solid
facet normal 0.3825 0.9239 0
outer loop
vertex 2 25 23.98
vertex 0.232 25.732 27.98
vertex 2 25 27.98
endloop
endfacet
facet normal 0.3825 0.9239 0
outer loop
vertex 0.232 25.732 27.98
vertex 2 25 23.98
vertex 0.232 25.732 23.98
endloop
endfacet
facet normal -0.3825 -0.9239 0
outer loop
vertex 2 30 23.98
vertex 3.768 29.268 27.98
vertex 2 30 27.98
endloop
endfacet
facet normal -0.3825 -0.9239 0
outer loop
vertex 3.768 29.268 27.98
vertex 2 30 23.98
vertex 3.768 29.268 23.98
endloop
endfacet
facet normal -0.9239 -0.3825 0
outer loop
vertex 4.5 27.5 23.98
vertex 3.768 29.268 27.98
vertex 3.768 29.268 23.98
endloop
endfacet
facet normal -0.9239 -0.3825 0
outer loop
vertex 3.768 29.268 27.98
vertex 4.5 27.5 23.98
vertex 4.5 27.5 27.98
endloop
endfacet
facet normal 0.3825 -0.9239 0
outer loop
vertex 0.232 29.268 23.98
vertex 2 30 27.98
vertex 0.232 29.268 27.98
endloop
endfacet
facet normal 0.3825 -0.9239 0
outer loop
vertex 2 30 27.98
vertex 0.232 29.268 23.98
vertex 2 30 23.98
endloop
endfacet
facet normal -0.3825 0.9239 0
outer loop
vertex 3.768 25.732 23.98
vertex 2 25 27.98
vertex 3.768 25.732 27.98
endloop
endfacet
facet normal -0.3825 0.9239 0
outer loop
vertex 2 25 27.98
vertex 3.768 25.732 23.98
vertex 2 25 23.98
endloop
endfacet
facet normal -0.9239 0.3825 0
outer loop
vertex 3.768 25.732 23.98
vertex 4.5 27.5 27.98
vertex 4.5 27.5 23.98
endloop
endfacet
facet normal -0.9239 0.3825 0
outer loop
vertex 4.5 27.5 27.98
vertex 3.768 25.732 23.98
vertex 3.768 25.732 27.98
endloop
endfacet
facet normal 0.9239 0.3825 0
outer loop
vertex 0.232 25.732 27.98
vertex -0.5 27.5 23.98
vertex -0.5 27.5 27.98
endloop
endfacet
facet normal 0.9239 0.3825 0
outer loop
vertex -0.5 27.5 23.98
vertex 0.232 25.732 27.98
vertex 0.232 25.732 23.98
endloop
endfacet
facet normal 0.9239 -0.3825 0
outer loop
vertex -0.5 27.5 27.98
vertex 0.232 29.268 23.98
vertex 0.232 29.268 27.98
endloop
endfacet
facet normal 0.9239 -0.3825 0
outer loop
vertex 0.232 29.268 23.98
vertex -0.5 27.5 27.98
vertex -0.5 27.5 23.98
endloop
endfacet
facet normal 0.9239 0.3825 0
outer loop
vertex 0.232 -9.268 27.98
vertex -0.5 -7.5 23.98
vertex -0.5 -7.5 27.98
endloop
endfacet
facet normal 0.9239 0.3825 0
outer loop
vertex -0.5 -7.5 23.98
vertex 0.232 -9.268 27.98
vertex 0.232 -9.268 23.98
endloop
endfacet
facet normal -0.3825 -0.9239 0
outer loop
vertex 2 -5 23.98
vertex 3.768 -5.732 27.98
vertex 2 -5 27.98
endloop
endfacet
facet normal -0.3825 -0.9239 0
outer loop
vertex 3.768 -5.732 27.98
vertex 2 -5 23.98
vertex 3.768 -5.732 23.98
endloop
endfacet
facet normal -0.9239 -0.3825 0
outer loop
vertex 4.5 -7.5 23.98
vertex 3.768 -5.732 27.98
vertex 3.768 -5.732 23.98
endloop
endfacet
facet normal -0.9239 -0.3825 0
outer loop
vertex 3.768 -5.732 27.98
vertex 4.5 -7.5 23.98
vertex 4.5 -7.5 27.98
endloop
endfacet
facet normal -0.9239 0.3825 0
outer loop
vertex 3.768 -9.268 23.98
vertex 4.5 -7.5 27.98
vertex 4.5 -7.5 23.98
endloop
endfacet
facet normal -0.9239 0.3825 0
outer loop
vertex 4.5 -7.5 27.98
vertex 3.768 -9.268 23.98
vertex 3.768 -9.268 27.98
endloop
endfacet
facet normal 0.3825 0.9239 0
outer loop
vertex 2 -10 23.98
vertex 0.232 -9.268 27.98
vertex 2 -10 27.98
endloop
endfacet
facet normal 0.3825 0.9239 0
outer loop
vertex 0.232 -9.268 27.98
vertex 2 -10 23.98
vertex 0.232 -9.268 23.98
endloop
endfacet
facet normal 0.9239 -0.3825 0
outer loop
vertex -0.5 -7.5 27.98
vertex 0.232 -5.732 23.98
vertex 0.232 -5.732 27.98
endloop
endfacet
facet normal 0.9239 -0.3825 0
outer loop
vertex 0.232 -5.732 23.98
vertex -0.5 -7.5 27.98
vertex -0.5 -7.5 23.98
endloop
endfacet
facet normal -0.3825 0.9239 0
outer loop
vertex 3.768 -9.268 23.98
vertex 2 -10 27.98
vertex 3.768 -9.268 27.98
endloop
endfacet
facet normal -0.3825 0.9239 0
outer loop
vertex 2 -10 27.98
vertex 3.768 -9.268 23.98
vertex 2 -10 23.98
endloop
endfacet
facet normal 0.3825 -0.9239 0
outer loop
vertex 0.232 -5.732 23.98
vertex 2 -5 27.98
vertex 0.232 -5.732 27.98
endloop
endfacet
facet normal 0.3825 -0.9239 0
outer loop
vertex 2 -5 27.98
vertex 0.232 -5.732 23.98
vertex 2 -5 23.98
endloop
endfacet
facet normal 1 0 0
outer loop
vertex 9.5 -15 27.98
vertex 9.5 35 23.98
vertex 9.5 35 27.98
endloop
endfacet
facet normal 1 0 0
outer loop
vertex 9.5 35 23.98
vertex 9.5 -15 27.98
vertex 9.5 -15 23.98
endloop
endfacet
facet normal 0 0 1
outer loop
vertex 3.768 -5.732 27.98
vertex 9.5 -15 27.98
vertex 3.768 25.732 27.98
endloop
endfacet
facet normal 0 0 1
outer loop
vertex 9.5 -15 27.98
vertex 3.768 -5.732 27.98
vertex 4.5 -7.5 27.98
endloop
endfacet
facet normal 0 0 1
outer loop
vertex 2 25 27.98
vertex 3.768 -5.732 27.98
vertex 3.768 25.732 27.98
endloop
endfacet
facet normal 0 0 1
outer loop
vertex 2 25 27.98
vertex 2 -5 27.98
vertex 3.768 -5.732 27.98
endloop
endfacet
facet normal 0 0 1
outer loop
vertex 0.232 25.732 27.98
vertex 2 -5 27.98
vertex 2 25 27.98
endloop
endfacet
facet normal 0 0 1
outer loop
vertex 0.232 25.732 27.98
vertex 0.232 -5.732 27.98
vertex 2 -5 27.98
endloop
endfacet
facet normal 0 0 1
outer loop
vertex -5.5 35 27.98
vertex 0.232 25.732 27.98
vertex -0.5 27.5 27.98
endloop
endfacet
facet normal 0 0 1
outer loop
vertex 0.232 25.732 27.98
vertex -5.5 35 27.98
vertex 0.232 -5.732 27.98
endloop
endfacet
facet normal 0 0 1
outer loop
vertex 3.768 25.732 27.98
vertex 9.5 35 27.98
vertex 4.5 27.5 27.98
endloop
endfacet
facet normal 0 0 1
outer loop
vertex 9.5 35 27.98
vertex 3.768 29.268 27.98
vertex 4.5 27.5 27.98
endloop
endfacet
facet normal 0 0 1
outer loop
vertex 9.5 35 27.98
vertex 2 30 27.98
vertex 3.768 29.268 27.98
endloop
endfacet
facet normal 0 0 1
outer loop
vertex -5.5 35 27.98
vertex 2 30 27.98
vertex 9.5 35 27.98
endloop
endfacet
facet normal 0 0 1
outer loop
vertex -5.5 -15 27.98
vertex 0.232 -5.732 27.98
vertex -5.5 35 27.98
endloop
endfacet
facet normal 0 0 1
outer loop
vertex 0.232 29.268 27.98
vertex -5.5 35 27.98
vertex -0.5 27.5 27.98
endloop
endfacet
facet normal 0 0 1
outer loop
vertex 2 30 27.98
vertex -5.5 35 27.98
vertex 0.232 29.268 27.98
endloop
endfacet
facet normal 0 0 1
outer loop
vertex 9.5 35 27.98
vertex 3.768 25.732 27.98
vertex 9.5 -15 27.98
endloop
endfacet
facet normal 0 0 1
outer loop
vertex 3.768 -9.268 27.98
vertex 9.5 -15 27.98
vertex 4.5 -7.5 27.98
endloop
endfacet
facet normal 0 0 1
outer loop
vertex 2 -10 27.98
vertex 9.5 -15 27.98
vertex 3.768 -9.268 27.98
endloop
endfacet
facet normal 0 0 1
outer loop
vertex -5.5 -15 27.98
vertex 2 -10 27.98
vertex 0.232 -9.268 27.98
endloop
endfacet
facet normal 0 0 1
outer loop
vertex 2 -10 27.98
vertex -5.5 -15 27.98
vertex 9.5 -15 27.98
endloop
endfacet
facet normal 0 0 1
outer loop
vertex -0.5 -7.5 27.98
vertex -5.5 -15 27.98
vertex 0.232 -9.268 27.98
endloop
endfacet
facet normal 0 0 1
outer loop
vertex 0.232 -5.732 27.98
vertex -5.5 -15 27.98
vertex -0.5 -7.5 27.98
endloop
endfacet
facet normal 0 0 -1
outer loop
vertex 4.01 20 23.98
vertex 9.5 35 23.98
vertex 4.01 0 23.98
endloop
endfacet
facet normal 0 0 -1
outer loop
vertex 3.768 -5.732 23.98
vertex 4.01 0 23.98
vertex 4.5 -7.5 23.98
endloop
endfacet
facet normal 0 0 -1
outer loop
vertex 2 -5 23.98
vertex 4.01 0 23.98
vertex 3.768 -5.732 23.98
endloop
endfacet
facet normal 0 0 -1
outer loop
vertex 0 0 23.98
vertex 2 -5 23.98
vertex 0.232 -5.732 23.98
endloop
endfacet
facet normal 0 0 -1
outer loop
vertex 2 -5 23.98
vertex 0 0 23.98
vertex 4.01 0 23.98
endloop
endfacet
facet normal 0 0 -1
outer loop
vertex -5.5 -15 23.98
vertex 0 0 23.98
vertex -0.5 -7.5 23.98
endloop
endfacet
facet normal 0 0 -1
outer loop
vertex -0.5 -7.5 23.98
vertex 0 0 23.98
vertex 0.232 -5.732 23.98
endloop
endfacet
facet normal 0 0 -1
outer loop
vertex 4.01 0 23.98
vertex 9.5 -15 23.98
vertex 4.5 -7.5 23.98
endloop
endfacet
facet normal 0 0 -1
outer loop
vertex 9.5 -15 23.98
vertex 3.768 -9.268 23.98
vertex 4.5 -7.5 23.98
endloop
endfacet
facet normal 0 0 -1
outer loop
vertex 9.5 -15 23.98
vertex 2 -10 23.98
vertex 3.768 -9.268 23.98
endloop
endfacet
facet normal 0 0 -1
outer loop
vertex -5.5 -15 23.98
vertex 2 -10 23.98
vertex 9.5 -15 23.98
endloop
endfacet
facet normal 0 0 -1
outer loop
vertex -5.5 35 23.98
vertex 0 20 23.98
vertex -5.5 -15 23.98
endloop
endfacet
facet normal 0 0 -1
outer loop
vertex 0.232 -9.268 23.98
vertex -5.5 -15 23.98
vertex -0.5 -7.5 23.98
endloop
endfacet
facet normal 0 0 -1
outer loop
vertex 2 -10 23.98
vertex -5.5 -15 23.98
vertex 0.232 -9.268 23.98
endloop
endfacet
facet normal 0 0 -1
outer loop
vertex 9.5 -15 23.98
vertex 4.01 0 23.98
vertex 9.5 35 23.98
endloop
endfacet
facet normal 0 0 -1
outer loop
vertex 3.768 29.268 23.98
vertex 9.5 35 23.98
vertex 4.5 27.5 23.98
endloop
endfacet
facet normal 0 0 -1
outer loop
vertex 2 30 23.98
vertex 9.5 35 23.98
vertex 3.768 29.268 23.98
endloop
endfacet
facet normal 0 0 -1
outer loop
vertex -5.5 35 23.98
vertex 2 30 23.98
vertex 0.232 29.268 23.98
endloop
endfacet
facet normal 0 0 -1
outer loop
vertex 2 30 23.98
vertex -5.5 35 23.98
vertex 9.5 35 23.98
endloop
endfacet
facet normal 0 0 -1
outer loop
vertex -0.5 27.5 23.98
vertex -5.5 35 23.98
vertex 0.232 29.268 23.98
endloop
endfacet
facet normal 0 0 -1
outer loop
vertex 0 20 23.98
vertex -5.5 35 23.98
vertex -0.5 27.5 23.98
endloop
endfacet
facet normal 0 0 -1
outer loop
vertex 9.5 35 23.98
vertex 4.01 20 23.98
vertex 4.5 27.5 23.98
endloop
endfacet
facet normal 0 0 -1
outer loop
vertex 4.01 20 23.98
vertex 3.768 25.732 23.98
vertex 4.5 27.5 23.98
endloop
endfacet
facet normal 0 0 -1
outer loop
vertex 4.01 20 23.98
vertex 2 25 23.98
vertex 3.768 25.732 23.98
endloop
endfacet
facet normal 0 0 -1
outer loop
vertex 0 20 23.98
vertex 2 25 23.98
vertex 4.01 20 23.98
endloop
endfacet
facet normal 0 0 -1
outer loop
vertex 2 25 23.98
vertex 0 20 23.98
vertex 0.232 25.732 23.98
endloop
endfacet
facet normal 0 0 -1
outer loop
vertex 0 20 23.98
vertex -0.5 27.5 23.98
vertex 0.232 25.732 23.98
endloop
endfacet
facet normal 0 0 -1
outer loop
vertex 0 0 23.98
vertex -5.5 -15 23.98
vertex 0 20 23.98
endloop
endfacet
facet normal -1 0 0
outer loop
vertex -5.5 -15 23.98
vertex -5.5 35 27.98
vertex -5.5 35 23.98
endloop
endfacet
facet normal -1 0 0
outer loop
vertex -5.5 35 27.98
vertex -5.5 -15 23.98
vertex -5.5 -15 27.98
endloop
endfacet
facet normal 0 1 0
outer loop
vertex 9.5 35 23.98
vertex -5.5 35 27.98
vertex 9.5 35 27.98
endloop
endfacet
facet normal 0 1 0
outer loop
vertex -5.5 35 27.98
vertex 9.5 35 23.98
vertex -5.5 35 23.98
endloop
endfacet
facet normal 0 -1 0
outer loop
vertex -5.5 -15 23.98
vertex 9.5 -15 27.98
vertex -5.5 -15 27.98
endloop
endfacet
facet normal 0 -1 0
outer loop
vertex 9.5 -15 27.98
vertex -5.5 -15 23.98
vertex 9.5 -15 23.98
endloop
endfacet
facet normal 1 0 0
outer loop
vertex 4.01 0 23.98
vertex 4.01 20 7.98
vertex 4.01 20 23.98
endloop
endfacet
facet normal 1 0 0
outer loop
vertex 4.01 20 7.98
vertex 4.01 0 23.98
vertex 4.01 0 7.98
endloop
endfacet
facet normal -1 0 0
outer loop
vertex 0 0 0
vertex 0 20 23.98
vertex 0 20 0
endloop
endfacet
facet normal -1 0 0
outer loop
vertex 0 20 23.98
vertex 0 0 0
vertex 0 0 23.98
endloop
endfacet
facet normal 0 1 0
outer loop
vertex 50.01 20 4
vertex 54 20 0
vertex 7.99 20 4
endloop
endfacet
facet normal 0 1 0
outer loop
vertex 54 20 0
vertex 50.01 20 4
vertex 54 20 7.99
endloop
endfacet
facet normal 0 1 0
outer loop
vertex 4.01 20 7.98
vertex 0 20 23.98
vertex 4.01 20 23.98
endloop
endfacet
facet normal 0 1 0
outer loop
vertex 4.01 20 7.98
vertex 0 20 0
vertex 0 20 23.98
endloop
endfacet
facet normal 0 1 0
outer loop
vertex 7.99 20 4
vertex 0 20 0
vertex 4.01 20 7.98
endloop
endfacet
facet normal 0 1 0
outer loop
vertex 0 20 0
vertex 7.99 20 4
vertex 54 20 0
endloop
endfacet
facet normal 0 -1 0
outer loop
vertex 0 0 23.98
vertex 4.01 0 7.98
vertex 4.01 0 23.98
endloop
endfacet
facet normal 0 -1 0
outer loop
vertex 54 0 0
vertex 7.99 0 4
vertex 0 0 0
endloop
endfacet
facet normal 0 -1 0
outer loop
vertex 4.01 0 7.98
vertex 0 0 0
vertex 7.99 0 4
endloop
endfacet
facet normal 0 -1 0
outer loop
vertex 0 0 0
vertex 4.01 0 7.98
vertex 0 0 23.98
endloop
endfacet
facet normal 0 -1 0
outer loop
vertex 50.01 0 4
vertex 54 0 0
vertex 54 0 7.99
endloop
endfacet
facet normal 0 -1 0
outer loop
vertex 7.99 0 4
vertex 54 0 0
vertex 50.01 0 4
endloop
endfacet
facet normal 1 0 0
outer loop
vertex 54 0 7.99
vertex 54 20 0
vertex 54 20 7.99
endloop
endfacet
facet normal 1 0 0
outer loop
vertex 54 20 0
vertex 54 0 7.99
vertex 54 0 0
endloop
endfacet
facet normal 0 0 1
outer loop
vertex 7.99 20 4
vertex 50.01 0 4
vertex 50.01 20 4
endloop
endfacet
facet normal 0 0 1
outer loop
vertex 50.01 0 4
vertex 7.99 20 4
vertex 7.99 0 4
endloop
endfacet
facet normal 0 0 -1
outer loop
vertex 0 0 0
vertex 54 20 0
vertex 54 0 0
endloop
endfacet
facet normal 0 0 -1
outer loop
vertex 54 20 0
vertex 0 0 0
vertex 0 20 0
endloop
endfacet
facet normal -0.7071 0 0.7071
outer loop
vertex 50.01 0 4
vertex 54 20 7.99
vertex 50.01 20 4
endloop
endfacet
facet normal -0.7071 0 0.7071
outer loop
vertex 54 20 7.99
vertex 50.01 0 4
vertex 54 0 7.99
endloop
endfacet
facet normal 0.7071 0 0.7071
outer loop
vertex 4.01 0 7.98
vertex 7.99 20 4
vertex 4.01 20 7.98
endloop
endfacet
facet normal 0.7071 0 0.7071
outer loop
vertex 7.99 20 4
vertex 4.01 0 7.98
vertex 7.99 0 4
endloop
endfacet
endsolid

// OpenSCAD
// Variables
thick=4;
length=50;
width=20;
drop=20;
hole_diam=5;
ts=4;
tp=[[ts,ts],[ts,0],[0,ts]];

// Support Beams
cube([length+thick,width,thick]);
translate([0,0,thick-.01]) {
    cube([thick+.01,width,drop]);
    translate([(hole_diam*3-thick)/-2,-3*hole_diam,drop-.01])
    difference() {
        cube([hole_diam*3,width+hole_diam*6,thick]);
        translate([hole_diam*1.5,hole_diam*1.5,-.5]) {
            translate([0,width+hole_diam*3,0])
                cylinder(d=hole_diam,h=thick+1);
            cylinder(d=hole_diam,h=thick+1);
        }
    }
}


// Edges
module tri() {
    rotate([-90,0,0])
    linear_extrude(height=width)
    polygon(points=tp);
}
translate([length+thick-ts,0,thick+ts-.01]) tri();
translate([ts+thick,width,thick+ts-.01]) rotate([0,0,180]) tri();
